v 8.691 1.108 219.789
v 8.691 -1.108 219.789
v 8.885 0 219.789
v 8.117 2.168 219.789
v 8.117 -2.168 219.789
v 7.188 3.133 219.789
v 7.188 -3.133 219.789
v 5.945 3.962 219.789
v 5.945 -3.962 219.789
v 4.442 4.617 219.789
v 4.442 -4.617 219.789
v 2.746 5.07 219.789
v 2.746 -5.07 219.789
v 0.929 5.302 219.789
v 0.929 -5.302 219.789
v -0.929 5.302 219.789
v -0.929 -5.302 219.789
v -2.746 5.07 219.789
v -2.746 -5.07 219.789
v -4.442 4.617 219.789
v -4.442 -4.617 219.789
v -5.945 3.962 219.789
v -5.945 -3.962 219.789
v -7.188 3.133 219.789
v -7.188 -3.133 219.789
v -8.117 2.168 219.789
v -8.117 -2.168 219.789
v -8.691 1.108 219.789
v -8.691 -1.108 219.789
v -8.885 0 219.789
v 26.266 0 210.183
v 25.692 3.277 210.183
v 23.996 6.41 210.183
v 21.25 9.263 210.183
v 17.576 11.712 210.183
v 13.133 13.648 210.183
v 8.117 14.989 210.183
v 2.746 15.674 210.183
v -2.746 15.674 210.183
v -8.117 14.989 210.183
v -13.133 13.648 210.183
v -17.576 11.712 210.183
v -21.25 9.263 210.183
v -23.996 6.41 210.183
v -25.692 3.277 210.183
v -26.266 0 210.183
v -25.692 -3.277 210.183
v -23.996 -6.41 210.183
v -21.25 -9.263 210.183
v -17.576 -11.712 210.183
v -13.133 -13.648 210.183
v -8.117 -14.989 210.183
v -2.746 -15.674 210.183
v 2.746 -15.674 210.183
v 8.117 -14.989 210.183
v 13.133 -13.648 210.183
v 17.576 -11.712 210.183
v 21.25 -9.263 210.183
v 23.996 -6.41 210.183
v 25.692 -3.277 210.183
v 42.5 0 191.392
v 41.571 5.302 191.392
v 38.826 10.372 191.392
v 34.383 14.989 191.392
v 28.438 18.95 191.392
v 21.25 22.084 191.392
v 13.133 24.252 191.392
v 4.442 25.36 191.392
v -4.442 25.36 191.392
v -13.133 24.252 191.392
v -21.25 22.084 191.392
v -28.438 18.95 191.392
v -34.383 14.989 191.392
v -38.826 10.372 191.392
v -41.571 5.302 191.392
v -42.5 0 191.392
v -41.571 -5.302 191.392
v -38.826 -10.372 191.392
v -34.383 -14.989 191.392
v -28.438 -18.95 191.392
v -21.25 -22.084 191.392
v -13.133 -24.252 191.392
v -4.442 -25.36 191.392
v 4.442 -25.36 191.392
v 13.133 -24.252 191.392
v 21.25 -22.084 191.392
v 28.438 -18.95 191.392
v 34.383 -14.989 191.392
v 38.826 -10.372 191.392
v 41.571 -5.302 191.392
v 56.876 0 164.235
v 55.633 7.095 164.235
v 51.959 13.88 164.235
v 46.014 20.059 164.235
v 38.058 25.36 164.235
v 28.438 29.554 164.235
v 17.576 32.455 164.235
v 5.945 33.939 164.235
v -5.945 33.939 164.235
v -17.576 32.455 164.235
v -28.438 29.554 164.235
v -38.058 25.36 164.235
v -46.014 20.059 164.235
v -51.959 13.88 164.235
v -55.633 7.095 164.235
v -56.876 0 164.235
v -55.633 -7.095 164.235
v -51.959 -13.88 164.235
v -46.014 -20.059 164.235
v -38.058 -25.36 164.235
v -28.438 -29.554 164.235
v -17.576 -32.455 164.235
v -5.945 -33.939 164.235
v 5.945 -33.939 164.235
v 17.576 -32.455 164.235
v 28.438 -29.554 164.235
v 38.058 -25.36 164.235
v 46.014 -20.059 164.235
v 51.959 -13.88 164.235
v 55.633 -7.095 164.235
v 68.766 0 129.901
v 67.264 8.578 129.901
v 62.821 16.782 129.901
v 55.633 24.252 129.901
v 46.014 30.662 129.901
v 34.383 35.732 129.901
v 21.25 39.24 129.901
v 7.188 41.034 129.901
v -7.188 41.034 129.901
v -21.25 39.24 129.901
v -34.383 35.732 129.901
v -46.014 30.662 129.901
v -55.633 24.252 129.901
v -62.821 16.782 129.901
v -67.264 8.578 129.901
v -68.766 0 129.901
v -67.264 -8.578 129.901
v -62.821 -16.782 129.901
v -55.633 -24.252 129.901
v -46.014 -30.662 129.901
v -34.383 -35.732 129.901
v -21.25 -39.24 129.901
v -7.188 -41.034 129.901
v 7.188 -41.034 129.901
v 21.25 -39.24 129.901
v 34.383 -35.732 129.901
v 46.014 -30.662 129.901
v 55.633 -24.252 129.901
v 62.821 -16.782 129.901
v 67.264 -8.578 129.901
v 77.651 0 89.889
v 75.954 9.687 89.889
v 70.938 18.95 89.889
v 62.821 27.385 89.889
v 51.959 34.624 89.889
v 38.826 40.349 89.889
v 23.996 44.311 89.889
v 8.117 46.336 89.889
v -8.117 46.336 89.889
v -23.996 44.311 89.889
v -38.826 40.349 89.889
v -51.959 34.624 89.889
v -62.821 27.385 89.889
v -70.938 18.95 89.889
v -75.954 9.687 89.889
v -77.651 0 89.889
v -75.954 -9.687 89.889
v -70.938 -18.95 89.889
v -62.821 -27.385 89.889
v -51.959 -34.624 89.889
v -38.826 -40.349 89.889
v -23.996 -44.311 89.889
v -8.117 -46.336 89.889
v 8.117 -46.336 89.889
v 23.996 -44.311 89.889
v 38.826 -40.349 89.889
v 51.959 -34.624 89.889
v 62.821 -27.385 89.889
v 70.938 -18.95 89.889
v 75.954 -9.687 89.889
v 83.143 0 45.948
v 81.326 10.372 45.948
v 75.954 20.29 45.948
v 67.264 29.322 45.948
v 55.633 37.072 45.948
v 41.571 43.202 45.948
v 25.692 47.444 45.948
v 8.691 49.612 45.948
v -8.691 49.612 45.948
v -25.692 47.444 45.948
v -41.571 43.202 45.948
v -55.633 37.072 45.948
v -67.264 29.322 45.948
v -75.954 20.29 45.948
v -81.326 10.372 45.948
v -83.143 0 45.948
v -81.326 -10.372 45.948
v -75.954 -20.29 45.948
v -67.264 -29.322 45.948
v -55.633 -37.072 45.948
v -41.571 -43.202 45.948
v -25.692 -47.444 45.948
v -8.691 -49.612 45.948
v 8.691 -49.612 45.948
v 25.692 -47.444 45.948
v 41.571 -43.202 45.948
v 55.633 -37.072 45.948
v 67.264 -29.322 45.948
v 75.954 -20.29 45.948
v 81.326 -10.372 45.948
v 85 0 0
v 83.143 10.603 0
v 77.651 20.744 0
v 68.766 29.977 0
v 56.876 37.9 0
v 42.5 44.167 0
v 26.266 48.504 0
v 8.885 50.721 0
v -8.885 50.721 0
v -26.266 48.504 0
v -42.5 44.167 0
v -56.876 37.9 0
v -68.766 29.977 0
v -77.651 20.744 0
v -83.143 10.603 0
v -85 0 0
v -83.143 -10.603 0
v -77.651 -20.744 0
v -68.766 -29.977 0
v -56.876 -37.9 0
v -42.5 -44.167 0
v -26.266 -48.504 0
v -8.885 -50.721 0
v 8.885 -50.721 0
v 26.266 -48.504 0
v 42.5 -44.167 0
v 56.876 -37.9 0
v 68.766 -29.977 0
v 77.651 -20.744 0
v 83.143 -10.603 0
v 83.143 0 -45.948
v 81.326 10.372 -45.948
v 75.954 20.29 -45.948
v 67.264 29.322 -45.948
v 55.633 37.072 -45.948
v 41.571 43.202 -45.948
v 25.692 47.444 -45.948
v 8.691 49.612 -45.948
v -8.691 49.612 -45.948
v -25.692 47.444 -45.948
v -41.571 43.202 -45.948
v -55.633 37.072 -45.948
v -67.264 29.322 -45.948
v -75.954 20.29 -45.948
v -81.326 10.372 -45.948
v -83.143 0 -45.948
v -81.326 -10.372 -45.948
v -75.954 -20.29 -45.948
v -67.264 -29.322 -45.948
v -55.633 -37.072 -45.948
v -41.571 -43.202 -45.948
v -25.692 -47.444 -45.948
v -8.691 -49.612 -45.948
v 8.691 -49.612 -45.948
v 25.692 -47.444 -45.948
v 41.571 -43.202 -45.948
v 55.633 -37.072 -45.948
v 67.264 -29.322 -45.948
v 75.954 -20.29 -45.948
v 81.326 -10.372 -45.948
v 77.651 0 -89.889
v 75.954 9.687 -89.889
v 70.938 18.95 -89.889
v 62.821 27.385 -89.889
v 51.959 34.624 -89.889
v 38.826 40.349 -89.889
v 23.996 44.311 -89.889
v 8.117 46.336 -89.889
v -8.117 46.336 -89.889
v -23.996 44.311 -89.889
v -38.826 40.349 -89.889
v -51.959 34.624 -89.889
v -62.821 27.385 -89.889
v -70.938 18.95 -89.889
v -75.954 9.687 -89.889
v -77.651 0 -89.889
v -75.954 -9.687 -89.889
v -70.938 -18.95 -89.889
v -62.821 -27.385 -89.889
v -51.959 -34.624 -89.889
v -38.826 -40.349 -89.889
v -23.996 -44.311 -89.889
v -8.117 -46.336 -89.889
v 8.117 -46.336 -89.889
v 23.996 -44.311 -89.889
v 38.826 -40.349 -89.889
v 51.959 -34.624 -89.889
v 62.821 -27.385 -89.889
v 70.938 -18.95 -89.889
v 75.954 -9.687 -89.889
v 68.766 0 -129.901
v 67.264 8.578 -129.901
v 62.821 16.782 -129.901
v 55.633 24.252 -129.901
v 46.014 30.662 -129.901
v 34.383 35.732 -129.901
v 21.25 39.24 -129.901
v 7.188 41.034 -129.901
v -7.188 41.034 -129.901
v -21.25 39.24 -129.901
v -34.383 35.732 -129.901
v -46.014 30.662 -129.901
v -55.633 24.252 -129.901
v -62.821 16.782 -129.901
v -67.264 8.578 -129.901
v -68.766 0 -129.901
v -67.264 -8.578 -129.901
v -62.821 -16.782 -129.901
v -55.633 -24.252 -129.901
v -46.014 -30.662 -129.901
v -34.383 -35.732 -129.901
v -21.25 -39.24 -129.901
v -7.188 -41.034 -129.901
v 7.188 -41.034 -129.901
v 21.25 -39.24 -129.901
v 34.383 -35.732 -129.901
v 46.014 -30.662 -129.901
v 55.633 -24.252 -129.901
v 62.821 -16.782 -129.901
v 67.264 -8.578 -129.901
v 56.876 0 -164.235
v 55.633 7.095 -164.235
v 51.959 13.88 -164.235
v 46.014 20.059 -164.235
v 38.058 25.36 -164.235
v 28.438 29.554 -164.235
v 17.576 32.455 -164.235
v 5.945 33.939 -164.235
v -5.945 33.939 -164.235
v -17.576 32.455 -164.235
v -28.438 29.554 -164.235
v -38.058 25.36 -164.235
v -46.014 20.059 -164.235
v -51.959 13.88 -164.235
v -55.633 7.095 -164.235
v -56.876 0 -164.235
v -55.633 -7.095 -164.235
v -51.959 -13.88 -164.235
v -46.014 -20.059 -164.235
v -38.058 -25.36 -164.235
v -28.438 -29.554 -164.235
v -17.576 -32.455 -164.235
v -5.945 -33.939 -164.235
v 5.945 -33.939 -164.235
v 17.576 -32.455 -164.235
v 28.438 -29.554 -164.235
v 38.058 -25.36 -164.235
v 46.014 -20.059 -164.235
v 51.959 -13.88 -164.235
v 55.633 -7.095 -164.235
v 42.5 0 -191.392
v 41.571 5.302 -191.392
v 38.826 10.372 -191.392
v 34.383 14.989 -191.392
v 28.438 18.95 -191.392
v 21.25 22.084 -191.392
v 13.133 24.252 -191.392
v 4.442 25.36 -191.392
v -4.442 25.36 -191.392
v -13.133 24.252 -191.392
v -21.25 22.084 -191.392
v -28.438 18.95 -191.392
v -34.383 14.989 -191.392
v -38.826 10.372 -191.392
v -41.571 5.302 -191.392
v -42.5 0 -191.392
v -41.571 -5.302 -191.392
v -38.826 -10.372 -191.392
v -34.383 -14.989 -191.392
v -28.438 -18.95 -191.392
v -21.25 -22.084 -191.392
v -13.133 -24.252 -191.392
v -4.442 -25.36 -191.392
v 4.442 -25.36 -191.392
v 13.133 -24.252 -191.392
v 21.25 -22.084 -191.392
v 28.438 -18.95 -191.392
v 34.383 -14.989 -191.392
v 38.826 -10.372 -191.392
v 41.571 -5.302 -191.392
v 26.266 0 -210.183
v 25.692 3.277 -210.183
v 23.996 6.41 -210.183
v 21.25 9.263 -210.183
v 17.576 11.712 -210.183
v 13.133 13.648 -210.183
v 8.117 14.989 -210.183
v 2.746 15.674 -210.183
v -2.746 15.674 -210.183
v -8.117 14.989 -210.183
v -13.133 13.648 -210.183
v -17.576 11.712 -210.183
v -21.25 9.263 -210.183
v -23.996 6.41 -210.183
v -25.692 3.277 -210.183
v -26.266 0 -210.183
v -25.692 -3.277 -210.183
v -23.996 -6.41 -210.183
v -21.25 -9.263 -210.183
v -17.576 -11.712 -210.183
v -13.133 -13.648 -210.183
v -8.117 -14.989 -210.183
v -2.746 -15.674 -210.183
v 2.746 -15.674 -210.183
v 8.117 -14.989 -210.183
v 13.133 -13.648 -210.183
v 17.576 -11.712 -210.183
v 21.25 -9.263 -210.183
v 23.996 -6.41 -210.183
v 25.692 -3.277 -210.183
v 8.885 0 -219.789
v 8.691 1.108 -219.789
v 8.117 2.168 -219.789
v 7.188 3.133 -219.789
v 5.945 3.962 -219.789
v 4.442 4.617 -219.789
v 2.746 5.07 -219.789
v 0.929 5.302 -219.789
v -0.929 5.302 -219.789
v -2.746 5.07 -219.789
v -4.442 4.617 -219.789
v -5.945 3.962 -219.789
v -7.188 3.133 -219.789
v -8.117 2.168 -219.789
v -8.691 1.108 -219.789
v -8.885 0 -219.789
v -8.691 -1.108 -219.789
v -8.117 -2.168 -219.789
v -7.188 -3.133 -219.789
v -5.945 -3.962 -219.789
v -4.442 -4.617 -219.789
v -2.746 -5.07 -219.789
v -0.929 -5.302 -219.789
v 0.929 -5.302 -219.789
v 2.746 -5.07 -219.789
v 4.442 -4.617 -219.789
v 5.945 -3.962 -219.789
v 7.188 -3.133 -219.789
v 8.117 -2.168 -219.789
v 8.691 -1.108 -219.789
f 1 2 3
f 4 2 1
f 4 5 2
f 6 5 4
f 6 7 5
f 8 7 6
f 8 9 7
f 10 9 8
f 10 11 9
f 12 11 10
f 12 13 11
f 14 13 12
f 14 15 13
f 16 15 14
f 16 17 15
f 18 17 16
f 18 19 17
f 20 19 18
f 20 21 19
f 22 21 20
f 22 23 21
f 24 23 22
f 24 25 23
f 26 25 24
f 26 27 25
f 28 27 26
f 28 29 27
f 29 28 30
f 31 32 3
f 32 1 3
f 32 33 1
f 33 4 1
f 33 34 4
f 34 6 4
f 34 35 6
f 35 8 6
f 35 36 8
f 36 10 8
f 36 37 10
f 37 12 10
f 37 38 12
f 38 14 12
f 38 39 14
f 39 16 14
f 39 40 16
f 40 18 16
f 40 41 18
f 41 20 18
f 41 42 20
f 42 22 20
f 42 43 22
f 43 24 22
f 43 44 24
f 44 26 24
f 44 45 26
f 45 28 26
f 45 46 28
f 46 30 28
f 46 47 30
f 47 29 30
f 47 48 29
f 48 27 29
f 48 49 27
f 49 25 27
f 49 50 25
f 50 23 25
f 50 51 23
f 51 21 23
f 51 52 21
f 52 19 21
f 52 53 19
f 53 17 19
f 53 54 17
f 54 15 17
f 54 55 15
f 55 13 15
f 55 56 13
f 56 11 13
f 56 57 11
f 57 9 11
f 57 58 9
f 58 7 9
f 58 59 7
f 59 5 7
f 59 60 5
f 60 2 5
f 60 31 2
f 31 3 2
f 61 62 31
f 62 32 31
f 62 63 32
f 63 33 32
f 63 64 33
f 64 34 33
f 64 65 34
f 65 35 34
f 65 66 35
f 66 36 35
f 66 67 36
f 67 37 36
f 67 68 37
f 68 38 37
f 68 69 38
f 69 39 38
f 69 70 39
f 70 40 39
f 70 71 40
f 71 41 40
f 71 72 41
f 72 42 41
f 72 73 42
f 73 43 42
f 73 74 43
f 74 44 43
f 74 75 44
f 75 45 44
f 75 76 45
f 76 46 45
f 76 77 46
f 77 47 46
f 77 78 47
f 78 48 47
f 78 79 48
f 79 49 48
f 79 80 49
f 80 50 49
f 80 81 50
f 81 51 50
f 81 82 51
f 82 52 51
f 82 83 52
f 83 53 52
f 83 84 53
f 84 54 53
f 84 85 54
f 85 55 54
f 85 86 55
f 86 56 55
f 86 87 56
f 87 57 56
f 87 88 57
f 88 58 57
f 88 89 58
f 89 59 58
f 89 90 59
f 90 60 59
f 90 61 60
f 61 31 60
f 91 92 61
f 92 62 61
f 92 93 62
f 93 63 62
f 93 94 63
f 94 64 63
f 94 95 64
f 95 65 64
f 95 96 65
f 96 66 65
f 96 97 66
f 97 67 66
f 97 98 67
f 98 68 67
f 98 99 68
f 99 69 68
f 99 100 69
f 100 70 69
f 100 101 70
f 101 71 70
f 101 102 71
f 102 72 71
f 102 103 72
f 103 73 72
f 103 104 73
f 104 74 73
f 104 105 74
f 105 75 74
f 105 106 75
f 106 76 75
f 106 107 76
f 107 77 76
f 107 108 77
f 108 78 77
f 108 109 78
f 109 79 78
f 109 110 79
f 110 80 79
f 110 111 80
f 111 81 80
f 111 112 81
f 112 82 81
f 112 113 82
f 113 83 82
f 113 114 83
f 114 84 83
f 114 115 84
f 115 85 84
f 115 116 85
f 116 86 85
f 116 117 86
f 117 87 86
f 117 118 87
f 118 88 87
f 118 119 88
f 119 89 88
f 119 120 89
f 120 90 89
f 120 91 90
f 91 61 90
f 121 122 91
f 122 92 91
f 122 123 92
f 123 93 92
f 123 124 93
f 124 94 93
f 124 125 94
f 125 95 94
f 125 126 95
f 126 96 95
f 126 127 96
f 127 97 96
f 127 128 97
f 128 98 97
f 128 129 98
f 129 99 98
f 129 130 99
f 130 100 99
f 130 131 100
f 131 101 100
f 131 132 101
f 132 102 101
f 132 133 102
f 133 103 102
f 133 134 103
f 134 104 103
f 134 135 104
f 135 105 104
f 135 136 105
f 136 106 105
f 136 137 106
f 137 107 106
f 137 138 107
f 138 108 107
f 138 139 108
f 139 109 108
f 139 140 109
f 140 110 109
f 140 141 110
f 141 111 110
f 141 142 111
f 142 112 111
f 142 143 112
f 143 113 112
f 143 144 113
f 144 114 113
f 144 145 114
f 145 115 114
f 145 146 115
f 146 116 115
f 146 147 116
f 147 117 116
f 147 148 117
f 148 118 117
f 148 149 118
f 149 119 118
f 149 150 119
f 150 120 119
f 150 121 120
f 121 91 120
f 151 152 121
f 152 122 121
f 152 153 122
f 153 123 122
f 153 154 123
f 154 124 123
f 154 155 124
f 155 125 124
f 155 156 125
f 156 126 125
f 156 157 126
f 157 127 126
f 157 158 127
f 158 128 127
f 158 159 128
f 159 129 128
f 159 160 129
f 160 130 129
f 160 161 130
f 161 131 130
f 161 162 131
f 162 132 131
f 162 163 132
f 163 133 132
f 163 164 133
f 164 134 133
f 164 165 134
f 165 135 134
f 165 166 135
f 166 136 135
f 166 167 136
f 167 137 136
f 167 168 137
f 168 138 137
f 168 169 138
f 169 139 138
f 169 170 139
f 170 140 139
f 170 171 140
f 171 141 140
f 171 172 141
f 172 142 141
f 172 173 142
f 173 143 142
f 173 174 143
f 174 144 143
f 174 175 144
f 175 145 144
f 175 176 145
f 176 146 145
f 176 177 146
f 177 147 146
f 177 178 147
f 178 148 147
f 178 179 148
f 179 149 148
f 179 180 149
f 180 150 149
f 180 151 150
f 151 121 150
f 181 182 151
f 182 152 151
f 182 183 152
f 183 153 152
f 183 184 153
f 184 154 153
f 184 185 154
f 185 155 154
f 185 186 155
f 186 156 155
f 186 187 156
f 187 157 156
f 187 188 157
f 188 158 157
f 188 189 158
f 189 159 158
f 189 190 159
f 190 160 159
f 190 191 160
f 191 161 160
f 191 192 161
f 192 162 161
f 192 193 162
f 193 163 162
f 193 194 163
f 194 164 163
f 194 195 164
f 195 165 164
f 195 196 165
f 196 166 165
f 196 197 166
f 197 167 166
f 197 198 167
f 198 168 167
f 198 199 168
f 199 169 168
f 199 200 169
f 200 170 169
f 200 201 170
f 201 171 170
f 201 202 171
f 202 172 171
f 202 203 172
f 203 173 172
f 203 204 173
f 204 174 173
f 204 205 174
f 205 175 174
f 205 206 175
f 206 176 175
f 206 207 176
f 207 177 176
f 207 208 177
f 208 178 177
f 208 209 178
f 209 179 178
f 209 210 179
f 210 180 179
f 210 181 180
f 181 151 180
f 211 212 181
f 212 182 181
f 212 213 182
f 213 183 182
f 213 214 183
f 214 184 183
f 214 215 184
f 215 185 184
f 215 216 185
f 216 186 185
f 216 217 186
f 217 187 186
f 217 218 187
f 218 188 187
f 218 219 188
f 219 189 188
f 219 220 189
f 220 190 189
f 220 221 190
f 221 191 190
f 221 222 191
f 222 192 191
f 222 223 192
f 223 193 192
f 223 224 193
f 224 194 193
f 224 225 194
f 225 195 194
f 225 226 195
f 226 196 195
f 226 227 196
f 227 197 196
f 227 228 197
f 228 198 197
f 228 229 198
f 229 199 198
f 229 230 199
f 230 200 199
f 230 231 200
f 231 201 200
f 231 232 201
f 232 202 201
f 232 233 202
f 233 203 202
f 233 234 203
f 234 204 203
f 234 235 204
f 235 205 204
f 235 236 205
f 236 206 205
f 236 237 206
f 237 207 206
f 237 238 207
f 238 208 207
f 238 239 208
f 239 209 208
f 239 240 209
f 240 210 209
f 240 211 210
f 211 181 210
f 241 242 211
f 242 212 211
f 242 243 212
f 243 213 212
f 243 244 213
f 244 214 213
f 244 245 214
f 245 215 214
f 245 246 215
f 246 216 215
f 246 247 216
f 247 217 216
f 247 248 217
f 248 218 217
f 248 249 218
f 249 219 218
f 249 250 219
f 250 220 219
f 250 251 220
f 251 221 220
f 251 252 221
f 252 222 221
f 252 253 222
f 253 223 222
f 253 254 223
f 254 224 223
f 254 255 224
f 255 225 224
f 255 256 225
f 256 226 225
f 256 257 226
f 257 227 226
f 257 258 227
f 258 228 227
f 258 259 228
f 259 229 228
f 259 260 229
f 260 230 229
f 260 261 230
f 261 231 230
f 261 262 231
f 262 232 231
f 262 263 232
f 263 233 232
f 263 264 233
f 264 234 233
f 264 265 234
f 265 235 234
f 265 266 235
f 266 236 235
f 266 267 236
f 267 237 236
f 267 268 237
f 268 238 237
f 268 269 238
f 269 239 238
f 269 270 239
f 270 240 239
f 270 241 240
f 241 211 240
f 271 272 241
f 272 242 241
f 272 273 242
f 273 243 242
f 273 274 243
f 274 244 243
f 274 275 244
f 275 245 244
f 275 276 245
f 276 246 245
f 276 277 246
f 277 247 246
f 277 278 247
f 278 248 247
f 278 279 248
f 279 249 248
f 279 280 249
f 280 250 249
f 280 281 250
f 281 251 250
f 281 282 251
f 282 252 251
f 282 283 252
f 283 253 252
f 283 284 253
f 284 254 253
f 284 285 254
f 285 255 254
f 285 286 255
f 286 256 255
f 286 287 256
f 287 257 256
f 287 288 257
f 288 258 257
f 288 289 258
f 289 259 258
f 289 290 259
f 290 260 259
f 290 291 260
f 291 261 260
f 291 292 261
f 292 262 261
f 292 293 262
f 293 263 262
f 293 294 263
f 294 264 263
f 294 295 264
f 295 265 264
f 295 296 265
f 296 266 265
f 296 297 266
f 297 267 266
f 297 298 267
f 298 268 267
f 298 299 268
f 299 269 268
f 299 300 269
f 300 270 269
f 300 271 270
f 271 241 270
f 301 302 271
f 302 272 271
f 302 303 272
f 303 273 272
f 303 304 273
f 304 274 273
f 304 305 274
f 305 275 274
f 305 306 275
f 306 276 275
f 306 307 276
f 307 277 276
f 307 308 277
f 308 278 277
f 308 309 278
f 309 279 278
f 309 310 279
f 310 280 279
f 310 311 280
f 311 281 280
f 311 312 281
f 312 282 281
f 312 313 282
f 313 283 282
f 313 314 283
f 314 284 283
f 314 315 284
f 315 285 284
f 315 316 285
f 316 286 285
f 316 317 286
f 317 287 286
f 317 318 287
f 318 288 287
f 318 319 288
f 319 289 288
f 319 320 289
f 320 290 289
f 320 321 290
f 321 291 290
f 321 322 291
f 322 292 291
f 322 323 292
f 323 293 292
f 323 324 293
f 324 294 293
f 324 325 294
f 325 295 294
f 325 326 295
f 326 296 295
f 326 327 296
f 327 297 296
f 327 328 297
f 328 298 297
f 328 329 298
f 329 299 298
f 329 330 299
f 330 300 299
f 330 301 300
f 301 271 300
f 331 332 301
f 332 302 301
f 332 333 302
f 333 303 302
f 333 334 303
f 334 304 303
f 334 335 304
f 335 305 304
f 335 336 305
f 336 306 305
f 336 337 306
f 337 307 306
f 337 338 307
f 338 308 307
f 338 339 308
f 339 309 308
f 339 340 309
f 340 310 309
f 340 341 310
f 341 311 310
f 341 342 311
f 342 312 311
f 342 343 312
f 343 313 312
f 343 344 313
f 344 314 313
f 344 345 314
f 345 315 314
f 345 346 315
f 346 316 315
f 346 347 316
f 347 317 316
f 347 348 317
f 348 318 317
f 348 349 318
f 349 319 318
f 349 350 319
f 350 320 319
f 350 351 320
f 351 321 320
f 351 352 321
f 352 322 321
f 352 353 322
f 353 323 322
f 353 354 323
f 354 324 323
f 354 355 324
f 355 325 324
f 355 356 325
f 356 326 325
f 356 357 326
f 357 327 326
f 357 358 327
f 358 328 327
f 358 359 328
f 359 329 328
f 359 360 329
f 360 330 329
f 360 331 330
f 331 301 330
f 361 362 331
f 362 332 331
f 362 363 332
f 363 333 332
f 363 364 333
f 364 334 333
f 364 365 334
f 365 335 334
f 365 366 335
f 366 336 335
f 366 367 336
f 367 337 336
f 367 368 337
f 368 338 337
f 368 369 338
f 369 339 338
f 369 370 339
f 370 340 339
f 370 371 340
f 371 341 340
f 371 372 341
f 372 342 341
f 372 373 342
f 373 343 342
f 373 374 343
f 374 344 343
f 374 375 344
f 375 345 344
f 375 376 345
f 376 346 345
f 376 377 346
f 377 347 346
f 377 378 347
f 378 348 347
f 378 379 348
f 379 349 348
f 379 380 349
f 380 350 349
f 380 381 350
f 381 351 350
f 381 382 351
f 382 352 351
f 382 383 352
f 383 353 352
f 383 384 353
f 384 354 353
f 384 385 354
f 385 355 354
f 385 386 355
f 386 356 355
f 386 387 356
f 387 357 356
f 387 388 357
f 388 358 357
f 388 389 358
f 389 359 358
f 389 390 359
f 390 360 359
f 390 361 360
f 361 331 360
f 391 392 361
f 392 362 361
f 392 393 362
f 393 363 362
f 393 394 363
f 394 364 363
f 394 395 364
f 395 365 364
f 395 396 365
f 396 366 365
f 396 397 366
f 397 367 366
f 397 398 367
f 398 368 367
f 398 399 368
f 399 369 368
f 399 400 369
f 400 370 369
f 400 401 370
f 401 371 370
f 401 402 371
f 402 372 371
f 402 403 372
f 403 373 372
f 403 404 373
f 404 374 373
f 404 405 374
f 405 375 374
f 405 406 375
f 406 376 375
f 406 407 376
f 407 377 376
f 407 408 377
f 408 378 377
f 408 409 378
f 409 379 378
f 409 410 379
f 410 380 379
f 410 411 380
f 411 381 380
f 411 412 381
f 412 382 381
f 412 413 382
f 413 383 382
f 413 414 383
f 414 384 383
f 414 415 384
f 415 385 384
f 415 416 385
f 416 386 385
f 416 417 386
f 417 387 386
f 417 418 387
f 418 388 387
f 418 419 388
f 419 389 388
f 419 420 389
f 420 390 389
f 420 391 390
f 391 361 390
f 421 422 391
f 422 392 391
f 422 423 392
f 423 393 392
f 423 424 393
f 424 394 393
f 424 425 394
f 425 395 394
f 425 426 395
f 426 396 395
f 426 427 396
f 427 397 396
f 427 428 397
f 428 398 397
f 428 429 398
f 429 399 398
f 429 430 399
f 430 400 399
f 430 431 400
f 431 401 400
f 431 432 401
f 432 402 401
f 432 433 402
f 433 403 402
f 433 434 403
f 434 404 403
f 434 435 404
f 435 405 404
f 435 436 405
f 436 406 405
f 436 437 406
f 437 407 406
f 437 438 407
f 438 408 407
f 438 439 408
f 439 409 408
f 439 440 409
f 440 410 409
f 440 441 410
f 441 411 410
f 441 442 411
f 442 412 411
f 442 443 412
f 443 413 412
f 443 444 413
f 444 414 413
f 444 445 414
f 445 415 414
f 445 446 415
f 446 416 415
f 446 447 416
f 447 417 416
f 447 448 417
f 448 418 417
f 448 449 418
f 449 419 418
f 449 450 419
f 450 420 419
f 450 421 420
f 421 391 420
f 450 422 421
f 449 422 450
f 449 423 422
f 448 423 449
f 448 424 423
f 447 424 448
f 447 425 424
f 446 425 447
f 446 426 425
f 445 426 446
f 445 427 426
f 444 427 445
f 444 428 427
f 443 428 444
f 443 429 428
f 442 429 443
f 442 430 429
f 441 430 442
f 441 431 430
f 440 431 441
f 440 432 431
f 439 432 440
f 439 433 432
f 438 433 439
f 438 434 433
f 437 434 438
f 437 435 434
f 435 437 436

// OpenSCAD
// Generated by SolidPython 1.0.1 on 2020-07-29 00:46:46


scale(v = [5, 3, 13]) {
	sphere(r = 17);
}
/***********************************************
*********      SolidPython code:      **********
************************************************
 
# import packages: SolidPython
from solid import *
from solid.utils import *
from itertools import chain, combinations, permutations


class Resize:

    def __init__(self, scad_file):
        self.scad_file = scad_file
        #self.scad_file = import_scad(scad_file)
        # cone/cylinder param:
        self.r1 = 0
        self.r2 = 0
        self.h = 0
        # rectangular prism param:
        self.w = 0
        self.l = 0
        # ellipse param:
        self.r = 0

    # import OpenScad code (file name corresponds to shape)


    # classify shape + parameters
    def assign(self, param1, param2, param3):
        if self.scad_file == 'cone.scad':
            self.r1 = param1
            self.r2 = param2
            self.h = param3
        elif self.scad_file == 'cylinder.scad':
            self.r1 = param1
            self.r2 = param2
            self.h = param3
        elif self.scad_file == 'rectangularPrism.scad':
            self.h = param1
            self.l = param2
            self.w = param3
        else:
            self.r = param1
            self.h = param2

    # resize parameters
    def iterate(self):
        x = range(3, 20, 2)
        i = 1
        if self.scad_file == 'cone.scad':
            tempList = list(permutations(x, 2))
            for temp in tempList:
                param1 = temp[0]
                param2 = temp[1]
                filepath = 'produced_scad_files/' + 'cone' + str(param1) + '_' + str(param2) + '_' + '.scad'
                scad_render_to_file(cylinder(h=param1, r1=param2, r2=0), filepath)

        elif self.scad_file == 'cylinder.scad':
            tempList = list(permutations(x, 3))
            for temp in tempList:
                param1 = temp[0]
                param2 = temp[1]
                filepath = 'produced_scad_files/' + 'cylinder' + str(param1) + '_' + str(param2) + '_' + '.scad'
                scad_render_to_file(cylinder(h=param1, r1=param2, r2=param2), filepath)

        elif self.scad_file == 'rectangularPrism.scad':
            tempList = list(permutations(x, 3))
            for temp in tempList:
                param1 = temp[0]
                param2 = temp[1]
                param3 = temp[2]
                filepath = 'produced_scad_files/' + 'rectangularPrism' + str(param1) + '_' + str(param2) + '_' + str(
                    param3) + '.scad'
                scad_render_to_file(cube(size=(param1, param2, param3)), filepath)

        elif self.scad_file == 'ellipse.scad':
            tempList = list(permutations(x, 4))
            for temp in tempList:
                param1 = temp[0]
                param2 = temp[1]
                param3 = temp[2]
                param4 = temp[3]
                filepath = 'produced_scad_files/' + 'ellipse' + str(param1) + '_' + str(param2) + '_' + str(param3) + '_' + str(param4) + '.scad'
                scad_render_to_file(scale([param1, param2, param3])(sphere(r=param4)), filepath)

    def render_to_scadfile(self):
        scad_render_to_file(scad, 'example.scad') 
 
************************************************/
